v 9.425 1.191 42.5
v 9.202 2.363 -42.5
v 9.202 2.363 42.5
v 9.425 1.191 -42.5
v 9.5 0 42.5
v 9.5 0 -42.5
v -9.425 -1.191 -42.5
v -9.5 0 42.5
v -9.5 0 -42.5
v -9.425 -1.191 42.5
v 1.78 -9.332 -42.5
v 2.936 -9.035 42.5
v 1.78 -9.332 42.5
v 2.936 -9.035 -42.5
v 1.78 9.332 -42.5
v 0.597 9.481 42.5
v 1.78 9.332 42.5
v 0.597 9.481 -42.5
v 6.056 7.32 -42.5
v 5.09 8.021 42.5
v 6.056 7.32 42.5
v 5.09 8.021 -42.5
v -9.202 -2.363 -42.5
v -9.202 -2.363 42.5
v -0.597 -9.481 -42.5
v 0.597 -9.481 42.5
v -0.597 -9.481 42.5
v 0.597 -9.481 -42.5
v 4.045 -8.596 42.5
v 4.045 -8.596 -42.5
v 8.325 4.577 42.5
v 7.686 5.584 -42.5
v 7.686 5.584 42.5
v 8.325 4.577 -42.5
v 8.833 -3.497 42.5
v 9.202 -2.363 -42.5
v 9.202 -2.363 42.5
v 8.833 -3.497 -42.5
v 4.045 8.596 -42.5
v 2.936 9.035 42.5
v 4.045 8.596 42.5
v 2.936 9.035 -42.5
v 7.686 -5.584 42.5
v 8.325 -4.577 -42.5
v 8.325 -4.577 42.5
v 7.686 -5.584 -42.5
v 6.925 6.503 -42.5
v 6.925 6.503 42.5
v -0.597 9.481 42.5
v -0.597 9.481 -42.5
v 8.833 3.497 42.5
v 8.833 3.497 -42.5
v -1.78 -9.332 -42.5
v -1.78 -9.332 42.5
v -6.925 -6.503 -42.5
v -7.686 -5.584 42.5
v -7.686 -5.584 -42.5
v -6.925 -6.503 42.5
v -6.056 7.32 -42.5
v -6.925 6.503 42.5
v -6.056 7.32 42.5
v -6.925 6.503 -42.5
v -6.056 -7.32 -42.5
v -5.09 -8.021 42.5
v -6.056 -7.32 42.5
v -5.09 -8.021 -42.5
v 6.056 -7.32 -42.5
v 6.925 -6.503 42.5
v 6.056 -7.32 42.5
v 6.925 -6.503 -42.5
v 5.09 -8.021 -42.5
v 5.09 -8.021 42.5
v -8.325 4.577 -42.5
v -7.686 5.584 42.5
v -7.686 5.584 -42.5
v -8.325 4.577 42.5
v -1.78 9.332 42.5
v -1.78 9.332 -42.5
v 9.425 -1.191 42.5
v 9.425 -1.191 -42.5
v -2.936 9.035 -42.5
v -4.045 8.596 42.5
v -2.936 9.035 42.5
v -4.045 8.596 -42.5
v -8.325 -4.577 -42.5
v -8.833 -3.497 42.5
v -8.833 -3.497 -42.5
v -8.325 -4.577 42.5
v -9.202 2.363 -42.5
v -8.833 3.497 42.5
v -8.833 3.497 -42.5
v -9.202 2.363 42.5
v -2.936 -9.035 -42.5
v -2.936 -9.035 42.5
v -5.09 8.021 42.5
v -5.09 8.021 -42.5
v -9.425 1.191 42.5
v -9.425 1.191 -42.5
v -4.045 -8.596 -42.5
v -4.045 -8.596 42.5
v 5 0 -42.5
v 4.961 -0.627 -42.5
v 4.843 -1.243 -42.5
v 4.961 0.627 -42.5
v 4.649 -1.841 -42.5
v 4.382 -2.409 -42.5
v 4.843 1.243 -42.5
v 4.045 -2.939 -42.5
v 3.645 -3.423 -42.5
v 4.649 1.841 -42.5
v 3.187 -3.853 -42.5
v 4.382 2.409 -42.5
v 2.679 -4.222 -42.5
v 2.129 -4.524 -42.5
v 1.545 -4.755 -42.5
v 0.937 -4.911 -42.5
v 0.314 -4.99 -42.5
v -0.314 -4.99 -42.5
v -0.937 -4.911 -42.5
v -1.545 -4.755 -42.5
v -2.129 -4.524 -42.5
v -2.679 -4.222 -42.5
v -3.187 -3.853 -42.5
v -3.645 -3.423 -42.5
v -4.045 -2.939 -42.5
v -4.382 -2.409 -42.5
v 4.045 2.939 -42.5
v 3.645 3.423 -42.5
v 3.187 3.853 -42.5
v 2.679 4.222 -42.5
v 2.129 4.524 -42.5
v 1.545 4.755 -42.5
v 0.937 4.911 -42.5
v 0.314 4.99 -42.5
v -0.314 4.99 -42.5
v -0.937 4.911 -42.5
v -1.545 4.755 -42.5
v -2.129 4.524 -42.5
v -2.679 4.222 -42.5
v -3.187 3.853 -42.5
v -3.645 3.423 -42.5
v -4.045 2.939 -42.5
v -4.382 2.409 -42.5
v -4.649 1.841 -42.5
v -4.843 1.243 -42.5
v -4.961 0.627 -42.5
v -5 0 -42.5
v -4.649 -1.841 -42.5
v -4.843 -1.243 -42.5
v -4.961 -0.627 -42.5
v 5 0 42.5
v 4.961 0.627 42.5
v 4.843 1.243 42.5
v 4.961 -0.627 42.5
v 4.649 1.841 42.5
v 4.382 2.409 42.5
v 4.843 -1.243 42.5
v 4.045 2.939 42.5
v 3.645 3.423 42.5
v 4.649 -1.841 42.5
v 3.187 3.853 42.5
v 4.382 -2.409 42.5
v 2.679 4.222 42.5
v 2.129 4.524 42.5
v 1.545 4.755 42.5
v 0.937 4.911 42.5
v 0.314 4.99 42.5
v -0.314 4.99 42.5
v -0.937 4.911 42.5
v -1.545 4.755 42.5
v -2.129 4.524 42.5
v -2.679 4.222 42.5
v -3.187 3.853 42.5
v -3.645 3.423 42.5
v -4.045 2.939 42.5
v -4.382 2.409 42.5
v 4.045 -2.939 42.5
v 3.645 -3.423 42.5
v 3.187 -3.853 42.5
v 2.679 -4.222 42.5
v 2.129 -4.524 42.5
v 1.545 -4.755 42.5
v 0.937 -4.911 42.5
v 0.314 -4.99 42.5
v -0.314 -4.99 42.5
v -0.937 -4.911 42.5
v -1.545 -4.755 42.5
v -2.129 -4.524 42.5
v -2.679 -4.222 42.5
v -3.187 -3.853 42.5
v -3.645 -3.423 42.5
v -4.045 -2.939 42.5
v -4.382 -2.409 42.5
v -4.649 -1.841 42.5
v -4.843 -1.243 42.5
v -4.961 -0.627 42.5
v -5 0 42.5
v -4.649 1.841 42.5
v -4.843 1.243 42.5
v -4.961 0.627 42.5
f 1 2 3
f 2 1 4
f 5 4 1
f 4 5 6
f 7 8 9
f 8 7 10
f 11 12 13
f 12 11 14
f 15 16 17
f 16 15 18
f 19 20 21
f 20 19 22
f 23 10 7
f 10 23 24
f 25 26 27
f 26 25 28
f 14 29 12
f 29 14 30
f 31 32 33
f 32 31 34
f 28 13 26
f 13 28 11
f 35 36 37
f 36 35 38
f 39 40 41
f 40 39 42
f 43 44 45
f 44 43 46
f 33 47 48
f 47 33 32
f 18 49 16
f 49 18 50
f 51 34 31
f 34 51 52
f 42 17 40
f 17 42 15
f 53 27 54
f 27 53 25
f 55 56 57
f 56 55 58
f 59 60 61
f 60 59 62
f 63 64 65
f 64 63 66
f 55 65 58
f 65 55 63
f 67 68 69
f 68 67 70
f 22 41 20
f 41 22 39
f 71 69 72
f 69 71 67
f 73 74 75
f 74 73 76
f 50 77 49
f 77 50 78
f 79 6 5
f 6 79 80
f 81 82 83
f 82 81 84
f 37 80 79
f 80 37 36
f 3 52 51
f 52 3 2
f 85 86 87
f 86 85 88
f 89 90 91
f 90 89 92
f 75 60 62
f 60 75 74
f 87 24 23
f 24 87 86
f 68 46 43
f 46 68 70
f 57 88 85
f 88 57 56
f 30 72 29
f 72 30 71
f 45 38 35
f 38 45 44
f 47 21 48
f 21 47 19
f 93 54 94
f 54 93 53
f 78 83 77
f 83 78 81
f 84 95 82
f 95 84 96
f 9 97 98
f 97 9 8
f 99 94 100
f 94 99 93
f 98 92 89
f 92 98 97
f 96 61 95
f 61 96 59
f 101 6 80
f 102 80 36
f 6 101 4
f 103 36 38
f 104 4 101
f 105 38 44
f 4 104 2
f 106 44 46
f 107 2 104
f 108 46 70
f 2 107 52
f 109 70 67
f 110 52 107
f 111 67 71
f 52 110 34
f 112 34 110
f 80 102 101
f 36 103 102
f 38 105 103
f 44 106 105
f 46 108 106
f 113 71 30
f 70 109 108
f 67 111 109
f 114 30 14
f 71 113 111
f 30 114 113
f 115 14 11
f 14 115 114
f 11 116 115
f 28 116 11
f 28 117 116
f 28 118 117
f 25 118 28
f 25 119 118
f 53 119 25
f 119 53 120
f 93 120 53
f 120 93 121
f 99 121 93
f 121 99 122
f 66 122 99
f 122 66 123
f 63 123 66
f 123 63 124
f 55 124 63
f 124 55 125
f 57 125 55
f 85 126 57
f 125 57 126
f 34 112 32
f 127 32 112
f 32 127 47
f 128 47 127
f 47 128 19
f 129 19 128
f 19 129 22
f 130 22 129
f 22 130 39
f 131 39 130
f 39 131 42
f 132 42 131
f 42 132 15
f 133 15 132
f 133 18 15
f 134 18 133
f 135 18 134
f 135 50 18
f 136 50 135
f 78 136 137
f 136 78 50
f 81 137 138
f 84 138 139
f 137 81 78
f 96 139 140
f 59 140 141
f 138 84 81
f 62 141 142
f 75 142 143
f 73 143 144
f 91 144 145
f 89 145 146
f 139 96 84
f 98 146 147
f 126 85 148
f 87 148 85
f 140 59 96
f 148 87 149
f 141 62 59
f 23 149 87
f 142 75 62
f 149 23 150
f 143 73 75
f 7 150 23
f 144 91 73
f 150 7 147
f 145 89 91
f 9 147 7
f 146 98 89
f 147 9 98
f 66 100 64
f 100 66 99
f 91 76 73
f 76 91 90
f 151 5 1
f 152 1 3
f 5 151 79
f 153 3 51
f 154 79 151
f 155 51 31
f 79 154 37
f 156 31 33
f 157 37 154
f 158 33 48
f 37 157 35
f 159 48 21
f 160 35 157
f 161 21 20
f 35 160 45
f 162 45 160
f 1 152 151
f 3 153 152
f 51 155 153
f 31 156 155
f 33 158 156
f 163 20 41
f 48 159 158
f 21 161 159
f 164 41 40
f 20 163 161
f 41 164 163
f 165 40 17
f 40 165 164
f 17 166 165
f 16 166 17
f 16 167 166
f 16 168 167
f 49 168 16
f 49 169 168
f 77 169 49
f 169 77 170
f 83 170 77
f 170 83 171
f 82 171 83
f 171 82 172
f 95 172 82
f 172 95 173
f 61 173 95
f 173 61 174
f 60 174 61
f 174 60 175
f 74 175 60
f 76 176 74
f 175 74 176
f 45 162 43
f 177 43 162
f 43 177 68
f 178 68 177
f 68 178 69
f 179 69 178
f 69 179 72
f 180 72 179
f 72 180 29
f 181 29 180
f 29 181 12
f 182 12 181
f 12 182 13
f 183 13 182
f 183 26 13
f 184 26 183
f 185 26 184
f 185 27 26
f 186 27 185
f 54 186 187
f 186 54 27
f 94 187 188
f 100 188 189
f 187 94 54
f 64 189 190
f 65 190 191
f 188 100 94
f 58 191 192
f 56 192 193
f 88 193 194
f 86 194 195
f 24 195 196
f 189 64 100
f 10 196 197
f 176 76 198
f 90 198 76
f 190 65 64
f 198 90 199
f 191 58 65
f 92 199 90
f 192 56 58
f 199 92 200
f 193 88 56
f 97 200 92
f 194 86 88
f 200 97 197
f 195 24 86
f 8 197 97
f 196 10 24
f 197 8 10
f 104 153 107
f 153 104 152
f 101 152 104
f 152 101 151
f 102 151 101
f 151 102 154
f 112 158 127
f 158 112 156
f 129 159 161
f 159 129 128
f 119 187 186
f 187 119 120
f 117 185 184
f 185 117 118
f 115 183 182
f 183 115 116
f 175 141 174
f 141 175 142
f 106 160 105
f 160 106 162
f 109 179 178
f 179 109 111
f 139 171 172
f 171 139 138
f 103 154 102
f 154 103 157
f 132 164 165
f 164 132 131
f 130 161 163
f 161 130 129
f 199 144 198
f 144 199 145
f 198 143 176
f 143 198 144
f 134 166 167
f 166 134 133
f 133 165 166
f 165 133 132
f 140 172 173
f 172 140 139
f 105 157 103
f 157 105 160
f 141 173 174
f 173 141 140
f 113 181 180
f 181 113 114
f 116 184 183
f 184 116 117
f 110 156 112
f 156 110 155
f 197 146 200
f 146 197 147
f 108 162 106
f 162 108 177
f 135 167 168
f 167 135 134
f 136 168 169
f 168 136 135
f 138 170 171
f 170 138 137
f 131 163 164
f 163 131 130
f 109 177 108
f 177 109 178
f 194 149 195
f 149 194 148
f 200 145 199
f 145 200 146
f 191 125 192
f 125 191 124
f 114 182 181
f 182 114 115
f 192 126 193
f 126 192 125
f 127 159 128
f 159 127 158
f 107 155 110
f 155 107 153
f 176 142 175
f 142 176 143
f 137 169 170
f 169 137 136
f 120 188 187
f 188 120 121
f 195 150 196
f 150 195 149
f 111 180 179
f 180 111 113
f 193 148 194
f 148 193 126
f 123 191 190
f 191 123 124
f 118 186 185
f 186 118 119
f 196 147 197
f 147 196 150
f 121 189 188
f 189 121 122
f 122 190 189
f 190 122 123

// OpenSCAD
$fn = 50;


difference() {
	union() {
		translate(v = [0, 0, -42.5000000000]) {
			cylinder(h = 85, r = 9.5000000000);
		}
	}
	union() {
		translate(v = [0, 0, -100.0000000000]) {
			cylinder(h = 200, r = 5.0000000000);
		}
	}
}
